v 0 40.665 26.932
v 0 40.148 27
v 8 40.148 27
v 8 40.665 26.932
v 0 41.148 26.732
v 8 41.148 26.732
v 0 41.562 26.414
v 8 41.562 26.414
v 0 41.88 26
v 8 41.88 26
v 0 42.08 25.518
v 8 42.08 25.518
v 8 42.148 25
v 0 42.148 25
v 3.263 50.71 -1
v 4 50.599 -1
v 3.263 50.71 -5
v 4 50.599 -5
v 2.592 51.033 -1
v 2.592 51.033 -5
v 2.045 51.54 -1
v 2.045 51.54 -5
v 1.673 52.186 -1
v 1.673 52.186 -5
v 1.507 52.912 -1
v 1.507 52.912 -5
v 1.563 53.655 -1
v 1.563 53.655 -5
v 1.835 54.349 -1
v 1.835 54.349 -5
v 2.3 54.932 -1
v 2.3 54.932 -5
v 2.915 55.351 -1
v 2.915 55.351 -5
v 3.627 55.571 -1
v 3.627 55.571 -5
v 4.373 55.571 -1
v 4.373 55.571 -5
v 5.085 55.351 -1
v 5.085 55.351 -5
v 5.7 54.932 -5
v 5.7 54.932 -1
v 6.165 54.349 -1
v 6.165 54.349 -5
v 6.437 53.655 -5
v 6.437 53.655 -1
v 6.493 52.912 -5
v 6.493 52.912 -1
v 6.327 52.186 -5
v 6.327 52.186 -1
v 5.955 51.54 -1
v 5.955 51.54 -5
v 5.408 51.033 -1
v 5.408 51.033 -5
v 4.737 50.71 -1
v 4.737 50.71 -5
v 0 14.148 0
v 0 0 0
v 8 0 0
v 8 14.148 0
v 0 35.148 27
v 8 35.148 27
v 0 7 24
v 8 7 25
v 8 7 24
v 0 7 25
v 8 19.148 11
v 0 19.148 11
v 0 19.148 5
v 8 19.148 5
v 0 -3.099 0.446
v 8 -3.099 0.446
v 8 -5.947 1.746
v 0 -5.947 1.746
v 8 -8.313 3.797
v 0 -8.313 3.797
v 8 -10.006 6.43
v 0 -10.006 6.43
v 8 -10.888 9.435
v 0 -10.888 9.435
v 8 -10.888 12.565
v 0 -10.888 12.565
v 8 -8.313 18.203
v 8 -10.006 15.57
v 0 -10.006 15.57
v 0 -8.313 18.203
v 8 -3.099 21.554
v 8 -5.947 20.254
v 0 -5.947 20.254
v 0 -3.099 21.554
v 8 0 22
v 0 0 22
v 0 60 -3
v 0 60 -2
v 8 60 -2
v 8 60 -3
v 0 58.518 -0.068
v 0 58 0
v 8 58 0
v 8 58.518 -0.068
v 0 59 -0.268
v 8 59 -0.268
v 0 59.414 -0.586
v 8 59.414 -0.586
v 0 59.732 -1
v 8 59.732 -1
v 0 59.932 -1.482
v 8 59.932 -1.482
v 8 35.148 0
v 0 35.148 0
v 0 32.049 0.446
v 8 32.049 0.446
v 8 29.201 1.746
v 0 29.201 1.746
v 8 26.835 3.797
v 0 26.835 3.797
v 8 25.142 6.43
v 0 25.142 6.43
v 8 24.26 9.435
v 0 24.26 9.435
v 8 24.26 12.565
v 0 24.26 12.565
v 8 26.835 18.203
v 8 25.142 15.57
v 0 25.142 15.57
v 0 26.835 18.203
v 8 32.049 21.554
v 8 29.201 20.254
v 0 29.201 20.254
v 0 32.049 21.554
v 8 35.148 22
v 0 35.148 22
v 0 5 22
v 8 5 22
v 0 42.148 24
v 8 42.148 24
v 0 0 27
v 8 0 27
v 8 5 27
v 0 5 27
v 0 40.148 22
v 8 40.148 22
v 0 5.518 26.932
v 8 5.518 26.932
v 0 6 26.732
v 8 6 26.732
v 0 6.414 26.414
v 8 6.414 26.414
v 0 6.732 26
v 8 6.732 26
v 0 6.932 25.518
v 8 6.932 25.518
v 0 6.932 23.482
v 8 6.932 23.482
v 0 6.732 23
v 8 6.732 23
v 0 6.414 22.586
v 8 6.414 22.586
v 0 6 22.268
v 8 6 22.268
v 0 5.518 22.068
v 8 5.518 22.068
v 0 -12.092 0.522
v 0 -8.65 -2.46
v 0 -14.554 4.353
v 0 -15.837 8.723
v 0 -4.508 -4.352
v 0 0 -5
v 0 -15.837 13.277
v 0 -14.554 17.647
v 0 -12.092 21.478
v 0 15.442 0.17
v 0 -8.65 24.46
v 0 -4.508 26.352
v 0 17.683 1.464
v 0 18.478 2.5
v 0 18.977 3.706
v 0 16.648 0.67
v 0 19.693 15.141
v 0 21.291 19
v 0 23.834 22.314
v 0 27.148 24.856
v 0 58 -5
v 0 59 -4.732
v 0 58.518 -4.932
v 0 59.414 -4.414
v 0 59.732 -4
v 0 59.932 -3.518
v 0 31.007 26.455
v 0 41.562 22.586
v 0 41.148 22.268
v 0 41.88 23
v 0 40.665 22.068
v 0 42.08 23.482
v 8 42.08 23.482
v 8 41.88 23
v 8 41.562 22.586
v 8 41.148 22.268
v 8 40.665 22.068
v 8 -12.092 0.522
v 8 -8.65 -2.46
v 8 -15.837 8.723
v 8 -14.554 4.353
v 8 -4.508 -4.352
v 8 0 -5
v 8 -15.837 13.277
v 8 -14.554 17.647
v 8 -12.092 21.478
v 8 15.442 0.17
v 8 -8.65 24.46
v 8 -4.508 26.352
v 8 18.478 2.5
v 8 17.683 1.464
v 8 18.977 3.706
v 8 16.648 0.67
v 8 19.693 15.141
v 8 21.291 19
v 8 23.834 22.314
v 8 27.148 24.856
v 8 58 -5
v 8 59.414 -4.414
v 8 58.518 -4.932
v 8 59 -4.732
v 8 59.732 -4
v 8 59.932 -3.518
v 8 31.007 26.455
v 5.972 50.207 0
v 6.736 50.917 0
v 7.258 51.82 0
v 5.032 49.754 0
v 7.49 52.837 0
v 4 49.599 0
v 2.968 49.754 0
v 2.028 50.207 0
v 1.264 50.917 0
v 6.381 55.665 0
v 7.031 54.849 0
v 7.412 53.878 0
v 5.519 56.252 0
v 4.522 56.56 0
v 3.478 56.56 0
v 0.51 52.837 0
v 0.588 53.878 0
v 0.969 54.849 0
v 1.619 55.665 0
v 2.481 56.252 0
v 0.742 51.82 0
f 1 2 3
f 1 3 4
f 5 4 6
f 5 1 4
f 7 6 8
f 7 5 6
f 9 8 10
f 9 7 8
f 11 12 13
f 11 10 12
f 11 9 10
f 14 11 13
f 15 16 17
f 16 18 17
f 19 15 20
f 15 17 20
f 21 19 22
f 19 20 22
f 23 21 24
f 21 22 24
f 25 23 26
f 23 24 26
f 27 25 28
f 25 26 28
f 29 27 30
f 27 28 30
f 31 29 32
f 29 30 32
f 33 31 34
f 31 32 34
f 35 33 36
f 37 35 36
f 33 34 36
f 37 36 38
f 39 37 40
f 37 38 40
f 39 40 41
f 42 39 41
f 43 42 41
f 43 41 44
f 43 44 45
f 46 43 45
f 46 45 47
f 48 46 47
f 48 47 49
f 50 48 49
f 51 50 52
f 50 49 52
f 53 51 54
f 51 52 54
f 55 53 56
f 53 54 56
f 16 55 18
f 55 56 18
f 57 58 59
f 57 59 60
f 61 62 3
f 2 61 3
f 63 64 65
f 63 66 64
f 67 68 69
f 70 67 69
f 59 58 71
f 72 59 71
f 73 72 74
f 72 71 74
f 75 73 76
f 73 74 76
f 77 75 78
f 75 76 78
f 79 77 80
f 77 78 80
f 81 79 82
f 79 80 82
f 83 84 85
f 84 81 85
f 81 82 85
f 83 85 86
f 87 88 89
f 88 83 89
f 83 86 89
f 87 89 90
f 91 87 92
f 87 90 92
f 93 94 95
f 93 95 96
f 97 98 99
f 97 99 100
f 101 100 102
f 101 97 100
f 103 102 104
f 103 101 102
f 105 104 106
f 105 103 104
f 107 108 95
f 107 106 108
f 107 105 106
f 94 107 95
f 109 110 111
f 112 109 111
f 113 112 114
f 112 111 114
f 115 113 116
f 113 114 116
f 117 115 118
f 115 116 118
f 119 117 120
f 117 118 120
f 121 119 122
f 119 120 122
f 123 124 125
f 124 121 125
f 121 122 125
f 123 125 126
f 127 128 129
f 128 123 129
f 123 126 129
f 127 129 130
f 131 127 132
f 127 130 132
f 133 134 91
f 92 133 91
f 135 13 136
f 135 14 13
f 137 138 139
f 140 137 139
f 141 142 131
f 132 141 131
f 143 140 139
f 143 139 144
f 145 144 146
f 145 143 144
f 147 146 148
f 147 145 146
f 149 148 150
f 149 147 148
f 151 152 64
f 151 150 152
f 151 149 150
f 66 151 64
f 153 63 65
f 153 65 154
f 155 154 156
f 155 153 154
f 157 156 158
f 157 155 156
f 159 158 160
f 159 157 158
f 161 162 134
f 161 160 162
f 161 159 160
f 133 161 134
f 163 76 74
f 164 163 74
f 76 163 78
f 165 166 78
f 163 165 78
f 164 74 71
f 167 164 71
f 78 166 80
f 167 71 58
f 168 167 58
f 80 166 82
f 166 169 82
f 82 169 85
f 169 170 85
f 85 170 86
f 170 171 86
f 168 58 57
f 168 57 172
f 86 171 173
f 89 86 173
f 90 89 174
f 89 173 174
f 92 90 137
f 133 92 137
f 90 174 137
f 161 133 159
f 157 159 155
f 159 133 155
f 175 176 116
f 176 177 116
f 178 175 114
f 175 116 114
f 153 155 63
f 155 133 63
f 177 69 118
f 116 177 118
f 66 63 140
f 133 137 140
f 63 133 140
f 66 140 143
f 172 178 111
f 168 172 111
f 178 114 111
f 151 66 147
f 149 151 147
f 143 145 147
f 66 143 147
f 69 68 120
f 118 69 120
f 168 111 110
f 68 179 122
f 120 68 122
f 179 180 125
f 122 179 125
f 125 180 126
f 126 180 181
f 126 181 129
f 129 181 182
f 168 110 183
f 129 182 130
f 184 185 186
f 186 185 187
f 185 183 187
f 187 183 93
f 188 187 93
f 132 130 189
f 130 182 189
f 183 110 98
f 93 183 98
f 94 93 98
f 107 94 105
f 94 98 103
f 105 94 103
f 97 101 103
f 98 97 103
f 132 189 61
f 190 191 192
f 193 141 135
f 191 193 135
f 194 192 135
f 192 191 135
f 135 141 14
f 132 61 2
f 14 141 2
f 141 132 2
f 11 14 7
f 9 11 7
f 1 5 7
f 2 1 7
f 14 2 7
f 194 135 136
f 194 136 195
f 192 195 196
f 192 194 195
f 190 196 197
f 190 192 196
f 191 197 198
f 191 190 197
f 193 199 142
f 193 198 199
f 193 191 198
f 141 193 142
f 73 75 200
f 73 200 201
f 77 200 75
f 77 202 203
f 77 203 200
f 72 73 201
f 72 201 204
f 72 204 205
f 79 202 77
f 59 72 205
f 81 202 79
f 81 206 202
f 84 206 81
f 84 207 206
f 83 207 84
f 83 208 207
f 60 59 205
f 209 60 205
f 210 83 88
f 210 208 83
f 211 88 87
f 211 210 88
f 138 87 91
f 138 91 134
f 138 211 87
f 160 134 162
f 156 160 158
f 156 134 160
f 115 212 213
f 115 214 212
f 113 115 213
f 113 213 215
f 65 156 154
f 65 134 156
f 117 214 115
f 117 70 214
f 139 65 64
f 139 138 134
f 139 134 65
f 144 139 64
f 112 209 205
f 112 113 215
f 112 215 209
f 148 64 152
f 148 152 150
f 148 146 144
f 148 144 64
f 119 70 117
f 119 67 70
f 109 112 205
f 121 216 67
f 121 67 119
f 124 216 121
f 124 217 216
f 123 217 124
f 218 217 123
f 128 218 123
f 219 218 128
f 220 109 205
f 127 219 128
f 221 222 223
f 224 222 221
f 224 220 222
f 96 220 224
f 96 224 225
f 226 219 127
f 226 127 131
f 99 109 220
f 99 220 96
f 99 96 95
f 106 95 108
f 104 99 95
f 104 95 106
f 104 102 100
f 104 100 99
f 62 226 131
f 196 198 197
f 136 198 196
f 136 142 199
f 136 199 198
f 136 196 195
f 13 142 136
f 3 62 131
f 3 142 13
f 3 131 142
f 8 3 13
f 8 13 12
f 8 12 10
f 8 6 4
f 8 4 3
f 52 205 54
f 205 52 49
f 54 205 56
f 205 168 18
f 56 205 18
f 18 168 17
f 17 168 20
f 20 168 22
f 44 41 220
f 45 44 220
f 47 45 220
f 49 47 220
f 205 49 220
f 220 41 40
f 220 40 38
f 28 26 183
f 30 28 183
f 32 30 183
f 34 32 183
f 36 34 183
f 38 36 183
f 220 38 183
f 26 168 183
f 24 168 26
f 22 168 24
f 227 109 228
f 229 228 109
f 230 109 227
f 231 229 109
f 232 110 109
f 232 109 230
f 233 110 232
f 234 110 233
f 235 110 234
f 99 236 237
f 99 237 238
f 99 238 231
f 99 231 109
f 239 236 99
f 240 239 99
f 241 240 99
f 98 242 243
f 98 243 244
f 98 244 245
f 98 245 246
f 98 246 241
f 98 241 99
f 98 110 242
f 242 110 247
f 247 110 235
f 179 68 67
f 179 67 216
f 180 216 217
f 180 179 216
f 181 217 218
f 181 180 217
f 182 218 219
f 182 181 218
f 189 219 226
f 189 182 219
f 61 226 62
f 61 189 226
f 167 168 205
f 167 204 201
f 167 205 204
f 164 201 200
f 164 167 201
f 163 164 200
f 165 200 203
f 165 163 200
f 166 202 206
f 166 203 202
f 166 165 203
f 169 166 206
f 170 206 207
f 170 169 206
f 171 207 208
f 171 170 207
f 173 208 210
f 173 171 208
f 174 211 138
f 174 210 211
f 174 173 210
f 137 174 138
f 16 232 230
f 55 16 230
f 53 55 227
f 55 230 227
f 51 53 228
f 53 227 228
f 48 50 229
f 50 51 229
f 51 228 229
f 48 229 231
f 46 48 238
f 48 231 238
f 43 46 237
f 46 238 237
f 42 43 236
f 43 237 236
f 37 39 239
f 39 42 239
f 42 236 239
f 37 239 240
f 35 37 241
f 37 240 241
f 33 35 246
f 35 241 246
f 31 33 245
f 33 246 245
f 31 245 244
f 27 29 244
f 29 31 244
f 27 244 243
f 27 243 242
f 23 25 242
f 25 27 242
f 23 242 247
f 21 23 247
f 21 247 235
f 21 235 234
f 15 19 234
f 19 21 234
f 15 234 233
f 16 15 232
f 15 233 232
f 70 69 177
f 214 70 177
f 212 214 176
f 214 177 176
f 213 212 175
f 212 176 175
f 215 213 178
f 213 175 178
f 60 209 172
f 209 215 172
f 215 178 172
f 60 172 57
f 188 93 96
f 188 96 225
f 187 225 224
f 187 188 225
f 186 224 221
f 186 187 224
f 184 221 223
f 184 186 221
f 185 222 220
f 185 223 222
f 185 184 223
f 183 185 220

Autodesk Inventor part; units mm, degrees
ref_plane "YZ Plane" through (0, 0, 0) normal (1, 0, 0) x (0, 1, 0)
ref_plane "XZ Plane" through (0, 0, 0) normal (0, 1, 0) x (-1, 0, 0)
ref_plane "XY Plane" through (0, 0, 0) normal (0, 0, 1) x (1, 0, 0)
sketch "Sketch1" plane through (0, 0, 0) normal (1, 0, 0) x (0, 1, 0)
  arc A0 (0, 22) -> (0, 0) centre (0, 11) ccw
  line L0 (-11, 11) -> (24, 11) construction
  arc A1 (35.1478, 22) -> (35.1478, 0) centre (35.1478, 11) ccw
  arc A2 (0, 27) -> (0, -5) centre (0, 11) ccw
  line L1 (0, -5) -> (58, -5)
  arc A3 (35.1478, 5022) -> (35.1478, -5000) centre (35.1478, 11) ccw
  arc A4 (35.1478, 27) -> (19.1478, 11) centre (35.1478, 11) ccw
  line L2 (0, 0) -> (14.1478, 0)
  line L3 (35.1478, 0) -> (58, 0)
  line L4 (35.1478, 27) -> (40.1478, 27)
  line L5 (42.1478, 25) -> (42.1478, 24)
  line L6 (40.1478, 22) -> (35.1478, 22)
  line L7 (0, 27) -> (5, 27)
  line L8 (7, 25) -> (7, 24)
  line L9 (5, 22) -> (0, 22)
  line L10 (60, -2) -> (60, -3)
  arc A5 (40.1478, 22) -> (42.1478, 24) centre (40.1478, 24) ccw
  arc A6 (42.1478, 25) -> (40.1478, 27) centre (40.1478, 25) ccw
  arc A7 (60, -2) -> (58, 0) centre (58, -2) ccw
  arc A8 (58, -5) -> (60, -3) centre (58, -3) ccw
  arc A9 (5, 22) -> (7, 24) centre (5, 24) ccw
  arc A10 (7, 25) -> (5, 27) centre (5, 25) ccw
  line L11 (19.1478, 11) -> (19.1478, 5)
  arc A11 (14.1478, 0) -> (19.1478, 5) centre (14.1478, 5) ccw
  point P0 (60, 0)
  point P1 (42.1478, 27)
  point P2 (42.1478, 22)
  point P3 (7, 27)
  dimension "d0" = 60
  dimension "d1" = 22
  dimension "d2" = 35
  dimension "d3" = 22
  dimension "d5" = 5
  dimension "d6" = 5000
  dimension "d7" = 5
  dimension "d8" = 7
  dimension "d9" = 5
  dimension "d10" = 7
  dimension "d11" = 2
  dimension "d12" = 5
extrude "Extrusion1" add sketch "Sketch1" along normal blind 8
ref_plane "Work Plane1" through (2, 58, 0) normal (0, 0, 1) x (1, 0, 0)
sketch "Sketch2" plane through (2, 58, 0) normal (0, 0, 1) x (1, 0, 0)
  line L0 (-2, 0) -> (6, 0) construction
  line L1 (-2, -22.8522) -> (6, -22.8522) construction
  line L2 (0, 0) -> (4, 0) construction
  line L3 (2, 0) -> (2, -9.8019) construction
  line L4 (-2, 0) -> (-2, -22.8522) projected
  line L5 (6, 0) -> (6, -22.8522) projected
  point P0 (-2, -58)
  point P1 (2, -4.901)
hole "Hole1" at (4, 53.099, 0) direction (0, 0, -1) diameter 5 end through all countersink diameter 7 countersink angle 90
properties part number "double_rounded_slim"
